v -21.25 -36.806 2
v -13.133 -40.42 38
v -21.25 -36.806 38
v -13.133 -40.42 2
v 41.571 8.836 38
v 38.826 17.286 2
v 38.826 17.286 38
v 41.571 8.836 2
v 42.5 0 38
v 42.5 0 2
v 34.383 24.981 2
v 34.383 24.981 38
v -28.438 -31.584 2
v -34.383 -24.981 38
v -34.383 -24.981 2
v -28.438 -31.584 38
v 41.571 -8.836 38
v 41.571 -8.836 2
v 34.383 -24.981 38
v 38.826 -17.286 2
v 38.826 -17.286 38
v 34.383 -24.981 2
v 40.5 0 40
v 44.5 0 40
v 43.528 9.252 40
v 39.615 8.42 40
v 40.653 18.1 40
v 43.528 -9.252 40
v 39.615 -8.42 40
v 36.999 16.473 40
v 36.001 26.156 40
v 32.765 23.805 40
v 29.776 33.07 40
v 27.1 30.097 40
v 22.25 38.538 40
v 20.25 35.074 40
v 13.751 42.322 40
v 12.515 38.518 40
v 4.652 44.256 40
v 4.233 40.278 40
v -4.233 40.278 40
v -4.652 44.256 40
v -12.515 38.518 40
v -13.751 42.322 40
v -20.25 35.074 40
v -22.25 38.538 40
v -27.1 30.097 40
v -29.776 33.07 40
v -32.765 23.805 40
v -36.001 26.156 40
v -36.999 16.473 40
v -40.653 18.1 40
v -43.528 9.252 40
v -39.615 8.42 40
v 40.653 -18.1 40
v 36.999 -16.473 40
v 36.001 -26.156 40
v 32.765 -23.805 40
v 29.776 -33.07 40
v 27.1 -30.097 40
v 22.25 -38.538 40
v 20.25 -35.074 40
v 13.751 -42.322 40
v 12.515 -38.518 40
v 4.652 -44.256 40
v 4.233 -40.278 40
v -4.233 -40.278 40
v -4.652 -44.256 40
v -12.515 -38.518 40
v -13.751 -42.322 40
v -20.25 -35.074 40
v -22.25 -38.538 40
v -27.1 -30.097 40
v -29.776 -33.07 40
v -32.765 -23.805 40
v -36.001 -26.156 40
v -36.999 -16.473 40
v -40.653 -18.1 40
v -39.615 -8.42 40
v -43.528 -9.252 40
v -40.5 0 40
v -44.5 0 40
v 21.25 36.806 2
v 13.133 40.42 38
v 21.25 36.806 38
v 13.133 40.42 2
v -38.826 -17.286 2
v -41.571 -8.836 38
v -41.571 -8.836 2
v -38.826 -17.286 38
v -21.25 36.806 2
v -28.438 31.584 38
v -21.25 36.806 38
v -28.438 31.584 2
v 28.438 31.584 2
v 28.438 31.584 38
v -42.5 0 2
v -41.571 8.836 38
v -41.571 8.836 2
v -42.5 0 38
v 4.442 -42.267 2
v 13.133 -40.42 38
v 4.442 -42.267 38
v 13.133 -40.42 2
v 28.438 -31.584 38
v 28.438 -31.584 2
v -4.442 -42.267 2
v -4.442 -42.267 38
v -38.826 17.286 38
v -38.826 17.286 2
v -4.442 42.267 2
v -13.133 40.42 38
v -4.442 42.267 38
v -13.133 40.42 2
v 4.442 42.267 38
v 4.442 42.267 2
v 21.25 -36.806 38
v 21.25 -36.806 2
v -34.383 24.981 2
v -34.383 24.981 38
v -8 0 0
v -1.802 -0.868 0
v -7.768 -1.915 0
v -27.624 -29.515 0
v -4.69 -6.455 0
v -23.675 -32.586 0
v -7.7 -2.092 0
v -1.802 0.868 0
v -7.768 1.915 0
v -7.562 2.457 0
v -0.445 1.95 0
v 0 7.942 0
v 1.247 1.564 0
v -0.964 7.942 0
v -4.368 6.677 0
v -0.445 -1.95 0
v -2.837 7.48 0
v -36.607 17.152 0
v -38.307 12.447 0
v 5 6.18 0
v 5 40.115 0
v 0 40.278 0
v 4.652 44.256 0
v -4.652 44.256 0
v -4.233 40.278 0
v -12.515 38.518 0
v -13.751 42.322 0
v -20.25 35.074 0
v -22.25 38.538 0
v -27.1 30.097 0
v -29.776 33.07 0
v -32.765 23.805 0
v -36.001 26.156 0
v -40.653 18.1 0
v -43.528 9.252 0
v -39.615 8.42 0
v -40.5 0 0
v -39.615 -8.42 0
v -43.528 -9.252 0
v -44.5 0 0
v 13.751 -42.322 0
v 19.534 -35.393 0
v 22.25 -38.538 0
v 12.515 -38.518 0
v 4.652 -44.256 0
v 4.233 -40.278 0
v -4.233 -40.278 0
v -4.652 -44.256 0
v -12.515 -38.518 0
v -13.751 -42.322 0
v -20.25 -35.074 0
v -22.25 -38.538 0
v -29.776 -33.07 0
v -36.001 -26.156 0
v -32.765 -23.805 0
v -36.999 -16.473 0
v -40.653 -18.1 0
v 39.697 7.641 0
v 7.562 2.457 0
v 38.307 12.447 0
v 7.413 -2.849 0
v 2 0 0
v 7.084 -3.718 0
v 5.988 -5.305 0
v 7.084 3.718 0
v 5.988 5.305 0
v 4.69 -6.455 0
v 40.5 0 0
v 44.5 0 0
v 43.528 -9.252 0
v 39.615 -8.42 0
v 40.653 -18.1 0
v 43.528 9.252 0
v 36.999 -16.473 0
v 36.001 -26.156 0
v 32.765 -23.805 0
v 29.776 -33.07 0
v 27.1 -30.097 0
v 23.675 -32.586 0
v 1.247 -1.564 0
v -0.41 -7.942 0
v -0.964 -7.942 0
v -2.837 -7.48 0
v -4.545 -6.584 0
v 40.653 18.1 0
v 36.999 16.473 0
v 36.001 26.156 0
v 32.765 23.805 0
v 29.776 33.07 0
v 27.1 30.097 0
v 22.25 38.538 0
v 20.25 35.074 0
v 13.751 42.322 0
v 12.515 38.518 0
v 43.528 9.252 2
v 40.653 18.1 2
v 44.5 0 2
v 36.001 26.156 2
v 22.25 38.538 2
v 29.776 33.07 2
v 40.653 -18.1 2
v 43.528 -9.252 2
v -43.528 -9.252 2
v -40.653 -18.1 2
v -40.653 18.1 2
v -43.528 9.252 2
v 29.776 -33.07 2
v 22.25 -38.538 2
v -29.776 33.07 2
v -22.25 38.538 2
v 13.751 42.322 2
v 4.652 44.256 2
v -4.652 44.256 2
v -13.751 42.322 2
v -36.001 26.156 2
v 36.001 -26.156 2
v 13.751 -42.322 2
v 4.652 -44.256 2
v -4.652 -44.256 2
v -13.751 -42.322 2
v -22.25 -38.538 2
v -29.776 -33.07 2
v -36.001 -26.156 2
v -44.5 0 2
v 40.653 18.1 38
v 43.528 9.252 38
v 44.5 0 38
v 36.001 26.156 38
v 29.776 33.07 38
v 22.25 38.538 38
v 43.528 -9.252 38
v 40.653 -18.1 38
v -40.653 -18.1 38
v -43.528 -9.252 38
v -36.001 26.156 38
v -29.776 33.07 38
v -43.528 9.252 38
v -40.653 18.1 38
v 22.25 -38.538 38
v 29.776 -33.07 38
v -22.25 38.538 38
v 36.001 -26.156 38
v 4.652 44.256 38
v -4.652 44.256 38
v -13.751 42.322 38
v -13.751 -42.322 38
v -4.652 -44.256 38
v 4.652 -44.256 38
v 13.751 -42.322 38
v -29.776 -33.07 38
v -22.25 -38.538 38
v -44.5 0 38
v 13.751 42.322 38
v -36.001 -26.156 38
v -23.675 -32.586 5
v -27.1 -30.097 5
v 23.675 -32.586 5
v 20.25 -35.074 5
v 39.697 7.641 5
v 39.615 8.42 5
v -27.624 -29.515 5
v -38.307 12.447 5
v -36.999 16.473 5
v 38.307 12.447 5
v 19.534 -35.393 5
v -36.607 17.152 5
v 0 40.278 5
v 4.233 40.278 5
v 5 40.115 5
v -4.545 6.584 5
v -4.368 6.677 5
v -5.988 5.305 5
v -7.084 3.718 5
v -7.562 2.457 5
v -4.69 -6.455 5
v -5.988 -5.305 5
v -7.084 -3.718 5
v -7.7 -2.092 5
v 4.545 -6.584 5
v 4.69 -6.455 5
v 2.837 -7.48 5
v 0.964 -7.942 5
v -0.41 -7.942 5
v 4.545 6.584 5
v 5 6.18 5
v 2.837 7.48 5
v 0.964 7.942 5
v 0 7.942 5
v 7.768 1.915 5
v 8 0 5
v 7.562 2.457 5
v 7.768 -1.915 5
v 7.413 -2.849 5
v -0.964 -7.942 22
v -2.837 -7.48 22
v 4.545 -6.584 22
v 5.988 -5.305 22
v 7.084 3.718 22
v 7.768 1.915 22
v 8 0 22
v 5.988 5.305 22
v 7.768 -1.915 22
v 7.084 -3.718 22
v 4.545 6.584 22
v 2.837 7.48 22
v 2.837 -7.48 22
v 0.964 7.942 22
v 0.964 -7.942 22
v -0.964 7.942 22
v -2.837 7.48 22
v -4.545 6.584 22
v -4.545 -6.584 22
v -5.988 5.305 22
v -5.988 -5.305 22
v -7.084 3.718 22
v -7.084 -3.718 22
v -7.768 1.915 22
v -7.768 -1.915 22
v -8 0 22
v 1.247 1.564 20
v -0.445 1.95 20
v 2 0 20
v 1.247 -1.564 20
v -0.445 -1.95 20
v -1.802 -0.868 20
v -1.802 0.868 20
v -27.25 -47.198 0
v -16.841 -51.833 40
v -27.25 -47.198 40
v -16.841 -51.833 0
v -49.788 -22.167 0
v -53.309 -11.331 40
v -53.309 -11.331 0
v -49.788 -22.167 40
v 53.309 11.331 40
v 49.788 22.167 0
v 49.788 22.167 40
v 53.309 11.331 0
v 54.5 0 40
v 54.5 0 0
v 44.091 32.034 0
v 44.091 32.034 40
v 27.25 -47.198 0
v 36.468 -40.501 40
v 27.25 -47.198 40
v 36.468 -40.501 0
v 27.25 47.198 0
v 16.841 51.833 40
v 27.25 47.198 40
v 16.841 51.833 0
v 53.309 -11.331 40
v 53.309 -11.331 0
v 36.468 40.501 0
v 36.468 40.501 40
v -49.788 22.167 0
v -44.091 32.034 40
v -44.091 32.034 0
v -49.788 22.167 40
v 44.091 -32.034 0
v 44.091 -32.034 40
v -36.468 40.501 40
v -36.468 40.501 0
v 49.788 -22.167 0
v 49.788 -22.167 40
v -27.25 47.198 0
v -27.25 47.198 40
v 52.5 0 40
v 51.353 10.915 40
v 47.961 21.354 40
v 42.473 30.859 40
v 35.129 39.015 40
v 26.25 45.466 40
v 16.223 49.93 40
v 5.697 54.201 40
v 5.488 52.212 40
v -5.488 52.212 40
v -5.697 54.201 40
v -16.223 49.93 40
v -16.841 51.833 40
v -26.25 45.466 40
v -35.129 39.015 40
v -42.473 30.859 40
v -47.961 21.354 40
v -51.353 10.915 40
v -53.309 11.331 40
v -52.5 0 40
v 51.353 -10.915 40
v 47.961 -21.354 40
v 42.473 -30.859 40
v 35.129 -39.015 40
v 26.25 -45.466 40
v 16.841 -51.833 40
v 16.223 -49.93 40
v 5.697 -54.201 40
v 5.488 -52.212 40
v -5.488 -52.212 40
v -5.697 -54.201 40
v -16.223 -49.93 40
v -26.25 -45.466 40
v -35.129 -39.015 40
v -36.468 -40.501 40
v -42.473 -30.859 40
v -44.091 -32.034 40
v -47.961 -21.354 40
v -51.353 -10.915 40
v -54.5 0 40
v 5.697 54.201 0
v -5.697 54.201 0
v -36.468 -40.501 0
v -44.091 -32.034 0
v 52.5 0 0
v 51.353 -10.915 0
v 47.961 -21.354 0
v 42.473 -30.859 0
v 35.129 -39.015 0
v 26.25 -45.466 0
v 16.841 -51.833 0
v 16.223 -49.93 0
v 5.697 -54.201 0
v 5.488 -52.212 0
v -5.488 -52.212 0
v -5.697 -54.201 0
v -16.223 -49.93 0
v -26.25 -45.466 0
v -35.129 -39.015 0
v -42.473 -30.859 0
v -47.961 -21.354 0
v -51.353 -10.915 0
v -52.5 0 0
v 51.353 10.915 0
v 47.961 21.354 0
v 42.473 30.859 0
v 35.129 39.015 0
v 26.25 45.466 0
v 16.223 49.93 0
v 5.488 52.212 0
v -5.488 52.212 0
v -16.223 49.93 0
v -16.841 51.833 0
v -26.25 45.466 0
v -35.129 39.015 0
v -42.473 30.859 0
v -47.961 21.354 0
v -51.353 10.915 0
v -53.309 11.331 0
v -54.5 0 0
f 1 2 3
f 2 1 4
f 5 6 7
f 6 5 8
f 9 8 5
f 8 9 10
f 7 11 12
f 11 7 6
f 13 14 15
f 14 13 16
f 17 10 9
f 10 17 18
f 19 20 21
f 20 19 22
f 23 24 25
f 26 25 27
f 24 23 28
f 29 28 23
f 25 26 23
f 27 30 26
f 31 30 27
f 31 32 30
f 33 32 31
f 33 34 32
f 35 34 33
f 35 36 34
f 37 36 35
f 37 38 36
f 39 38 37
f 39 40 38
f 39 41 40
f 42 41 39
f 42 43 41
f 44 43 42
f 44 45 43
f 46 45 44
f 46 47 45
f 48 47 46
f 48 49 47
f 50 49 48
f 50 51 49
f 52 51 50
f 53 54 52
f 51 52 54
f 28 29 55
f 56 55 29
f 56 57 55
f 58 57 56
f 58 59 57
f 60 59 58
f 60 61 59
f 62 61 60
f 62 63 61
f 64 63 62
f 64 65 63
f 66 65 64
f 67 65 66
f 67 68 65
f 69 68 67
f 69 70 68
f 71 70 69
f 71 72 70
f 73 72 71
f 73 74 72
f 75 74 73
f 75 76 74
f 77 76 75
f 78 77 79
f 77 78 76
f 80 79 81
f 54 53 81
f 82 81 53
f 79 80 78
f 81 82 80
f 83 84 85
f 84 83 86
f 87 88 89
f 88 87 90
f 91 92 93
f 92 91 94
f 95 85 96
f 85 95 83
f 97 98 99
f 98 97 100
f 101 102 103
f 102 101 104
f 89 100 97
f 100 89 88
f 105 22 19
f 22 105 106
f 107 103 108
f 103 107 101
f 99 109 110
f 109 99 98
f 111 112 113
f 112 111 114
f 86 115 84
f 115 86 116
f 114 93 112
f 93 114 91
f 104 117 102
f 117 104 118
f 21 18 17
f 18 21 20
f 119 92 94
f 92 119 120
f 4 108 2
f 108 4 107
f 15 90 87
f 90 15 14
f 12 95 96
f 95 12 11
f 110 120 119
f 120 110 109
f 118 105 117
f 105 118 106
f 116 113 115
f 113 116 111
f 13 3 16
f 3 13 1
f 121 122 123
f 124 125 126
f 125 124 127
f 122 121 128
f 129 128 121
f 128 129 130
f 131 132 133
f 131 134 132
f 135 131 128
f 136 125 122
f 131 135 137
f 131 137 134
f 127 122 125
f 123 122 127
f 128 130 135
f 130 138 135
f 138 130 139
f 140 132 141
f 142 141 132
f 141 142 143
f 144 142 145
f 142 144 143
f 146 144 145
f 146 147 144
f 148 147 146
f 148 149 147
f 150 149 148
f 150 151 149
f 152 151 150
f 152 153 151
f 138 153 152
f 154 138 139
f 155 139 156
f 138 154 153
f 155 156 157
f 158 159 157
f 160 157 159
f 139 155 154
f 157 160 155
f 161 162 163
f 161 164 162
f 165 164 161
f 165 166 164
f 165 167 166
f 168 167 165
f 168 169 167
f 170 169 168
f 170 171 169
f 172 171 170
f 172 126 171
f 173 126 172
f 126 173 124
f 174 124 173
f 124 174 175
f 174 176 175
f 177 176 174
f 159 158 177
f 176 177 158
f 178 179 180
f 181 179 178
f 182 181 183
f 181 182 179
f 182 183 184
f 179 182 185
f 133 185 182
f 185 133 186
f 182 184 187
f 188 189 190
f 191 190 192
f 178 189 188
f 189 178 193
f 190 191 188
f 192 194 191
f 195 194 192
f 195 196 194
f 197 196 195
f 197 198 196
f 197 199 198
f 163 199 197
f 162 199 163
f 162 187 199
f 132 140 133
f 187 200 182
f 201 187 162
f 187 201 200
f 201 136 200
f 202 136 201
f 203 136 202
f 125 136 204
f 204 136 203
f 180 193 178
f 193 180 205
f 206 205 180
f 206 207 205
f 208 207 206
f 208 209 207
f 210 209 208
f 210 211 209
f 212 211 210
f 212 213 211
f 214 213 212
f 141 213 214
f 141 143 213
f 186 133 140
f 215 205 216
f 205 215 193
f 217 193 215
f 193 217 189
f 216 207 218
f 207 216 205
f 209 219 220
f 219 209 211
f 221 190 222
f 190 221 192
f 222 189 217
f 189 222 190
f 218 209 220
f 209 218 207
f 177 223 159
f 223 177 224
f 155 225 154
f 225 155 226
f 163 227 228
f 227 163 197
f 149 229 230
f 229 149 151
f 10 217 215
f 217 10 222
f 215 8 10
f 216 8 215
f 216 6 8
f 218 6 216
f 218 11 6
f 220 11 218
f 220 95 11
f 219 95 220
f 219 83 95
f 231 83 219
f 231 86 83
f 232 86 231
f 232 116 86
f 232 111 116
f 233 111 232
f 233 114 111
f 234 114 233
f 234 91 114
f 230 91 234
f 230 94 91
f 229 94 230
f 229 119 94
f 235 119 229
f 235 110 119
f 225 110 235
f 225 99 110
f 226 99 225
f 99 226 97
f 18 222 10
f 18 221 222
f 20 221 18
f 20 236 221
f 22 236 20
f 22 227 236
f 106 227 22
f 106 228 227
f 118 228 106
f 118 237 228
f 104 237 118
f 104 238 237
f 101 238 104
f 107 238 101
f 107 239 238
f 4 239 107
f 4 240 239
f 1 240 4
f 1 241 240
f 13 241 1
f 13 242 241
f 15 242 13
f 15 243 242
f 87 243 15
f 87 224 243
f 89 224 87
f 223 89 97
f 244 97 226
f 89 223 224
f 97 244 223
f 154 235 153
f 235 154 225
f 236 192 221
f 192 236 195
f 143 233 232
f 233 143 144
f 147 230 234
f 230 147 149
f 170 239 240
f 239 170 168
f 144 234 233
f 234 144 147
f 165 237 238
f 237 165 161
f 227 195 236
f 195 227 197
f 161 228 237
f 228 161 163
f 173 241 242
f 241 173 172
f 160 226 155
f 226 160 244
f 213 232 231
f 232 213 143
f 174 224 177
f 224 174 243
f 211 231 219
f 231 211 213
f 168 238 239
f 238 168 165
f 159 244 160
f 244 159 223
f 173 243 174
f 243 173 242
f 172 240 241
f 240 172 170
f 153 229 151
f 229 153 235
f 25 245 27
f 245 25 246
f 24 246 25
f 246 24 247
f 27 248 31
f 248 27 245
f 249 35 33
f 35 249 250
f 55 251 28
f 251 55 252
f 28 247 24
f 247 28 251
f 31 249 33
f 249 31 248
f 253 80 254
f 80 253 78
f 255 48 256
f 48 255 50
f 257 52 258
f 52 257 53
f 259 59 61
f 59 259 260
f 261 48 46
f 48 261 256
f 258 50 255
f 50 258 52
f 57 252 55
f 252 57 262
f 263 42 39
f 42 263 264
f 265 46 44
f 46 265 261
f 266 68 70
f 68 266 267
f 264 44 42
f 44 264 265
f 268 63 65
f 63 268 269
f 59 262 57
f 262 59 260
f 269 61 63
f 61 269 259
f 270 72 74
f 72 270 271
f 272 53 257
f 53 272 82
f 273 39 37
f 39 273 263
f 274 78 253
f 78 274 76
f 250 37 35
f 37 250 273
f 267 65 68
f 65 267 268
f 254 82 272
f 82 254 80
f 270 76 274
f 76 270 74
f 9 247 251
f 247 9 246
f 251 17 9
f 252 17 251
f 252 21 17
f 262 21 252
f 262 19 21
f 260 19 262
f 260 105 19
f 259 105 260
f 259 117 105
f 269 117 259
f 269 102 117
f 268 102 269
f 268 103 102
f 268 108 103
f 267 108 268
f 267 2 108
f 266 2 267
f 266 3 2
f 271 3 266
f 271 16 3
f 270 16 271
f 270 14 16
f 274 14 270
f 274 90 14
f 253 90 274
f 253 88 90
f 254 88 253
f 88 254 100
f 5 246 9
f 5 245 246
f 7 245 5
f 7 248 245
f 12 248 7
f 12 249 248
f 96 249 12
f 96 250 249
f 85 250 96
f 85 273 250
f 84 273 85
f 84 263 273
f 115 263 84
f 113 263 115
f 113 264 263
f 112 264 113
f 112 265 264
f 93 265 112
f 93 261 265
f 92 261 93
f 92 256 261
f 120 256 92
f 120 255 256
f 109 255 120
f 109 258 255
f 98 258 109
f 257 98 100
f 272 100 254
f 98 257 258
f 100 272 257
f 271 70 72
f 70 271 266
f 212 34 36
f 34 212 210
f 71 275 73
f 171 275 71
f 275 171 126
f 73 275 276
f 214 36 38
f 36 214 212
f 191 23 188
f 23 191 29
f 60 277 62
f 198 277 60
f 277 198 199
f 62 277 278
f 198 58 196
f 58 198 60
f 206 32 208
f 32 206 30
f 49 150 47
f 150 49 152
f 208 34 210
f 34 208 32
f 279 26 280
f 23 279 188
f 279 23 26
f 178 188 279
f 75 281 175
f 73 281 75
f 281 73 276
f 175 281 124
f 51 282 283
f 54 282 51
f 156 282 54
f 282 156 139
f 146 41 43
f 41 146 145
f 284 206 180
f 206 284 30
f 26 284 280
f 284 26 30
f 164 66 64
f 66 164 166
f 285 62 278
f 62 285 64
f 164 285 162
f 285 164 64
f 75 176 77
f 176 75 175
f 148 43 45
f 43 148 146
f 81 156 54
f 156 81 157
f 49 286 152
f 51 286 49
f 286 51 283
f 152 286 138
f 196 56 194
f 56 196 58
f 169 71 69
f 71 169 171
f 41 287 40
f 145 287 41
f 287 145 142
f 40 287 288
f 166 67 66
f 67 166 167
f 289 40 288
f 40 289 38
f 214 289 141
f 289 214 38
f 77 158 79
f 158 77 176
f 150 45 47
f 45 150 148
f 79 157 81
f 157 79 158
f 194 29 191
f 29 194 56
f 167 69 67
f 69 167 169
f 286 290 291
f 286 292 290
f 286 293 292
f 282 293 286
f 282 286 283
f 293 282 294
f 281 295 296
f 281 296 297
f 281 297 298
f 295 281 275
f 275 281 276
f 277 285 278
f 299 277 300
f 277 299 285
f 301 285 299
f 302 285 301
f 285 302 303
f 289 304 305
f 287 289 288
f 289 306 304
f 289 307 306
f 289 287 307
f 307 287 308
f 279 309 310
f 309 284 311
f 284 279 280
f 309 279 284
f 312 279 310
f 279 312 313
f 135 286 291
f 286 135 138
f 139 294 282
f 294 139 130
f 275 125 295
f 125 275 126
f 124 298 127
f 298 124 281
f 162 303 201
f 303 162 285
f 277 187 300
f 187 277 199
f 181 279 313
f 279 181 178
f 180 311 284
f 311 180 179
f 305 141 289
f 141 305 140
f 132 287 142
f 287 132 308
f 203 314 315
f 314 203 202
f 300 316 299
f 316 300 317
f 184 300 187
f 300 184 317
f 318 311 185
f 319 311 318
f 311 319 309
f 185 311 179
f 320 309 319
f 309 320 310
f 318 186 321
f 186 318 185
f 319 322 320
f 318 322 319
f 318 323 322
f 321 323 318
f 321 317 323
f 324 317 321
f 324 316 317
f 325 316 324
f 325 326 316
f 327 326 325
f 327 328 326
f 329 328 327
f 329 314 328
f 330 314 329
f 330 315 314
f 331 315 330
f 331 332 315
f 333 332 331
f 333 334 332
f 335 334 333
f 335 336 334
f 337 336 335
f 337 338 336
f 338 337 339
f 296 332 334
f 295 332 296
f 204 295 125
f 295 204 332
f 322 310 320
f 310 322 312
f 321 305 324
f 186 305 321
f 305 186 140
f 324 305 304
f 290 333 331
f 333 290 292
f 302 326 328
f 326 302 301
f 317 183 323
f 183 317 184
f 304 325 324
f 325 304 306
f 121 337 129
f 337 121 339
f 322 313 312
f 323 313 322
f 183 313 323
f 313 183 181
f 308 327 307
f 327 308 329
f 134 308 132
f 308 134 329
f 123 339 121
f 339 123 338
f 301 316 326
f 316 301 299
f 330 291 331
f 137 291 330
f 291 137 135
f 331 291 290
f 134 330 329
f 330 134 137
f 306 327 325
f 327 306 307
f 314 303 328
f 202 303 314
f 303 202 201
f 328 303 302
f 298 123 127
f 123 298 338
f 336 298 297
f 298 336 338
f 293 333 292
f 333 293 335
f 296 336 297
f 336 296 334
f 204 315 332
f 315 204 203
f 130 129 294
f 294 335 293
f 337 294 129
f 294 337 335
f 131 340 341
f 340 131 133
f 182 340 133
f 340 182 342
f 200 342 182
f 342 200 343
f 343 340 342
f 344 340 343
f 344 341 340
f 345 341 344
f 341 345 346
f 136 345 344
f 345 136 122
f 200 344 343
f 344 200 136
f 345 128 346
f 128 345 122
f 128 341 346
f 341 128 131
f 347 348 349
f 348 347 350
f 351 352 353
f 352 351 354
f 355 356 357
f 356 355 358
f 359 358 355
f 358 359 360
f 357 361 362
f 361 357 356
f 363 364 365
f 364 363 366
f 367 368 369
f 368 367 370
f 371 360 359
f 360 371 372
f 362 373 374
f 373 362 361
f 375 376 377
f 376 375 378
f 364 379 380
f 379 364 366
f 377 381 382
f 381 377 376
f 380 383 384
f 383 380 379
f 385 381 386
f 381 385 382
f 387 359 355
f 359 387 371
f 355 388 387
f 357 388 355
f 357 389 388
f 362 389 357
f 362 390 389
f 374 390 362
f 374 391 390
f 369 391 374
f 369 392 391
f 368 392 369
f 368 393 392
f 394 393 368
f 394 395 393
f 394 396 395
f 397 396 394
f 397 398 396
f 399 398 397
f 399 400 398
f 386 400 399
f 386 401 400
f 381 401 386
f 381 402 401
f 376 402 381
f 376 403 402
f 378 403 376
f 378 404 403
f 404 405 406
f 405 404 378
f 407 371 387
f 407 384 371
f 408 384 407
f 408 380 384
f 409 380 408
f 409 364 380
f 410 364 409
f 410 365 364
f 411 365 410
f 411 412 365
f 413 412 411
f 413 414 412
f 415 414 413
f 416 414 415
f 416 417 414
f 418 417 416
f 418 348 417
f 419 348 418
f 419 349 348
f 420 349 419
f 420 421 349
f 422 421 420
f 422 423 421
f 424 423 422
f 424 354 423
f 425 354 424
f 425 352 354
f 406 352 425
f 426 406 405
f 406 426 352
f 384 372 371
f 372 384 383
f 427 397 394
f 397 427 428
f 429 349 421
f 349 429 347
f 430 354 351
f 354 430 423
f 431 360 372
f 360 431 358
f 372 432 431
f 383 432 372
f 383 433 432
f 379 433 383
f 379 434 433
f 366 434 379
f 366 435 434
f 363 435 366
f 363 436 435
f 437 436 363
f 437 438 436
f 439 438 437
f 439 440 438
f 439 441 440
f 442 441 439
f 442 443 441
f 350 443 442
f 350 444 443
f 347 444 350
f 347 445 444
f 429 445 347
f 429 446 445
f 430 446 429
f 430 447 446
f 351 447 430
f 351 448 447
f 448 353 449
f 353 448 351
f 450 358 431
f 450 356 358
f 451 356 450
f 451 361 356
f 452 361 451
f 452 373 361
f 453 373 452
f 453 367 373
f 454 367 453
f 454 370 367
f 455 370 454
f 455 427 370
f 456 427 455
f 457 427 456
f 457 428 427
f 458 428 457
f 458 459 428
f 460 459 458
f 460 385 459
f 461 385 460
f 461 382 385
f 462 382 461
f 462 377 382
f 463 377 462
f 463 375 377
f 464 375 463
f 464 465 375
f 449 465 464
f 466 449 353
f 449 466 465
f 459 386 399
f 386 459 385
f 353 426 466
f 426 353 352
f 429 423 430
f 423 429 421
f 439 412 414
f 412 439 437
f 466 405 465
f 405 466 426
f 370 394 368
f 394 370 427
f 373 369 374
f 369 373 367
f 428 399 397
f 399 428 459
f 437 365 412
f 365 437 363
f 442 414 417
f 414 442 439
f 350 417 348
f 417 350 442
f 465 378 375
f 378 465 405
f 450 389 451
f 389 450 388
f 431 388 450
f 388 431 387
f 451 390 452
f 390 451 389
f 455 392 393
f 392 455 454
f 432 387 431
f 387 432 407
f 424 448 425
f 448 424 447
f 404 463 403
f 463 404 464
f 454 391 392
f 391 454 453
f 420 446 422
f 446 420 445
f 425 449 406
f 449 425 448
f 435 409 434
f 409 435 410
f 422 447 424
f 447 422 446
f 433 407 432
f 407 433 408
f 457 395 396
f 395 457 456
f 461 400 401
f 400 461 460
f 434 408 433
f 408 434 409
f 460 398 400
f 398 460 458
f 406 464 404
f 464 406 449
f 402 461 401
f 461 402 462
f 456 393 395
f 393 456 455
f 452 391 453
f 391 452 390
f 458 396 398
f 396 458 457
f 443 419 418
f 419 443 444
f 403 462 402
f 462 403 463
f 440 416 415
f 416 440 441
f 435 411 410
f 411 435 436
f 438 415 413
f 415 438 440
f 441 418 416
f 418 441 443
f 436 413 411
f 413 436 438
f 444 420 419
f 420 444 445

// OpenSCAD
spindle_d= 4;
spindle_l = 20;
inner_hub_d = spindle_d + 4;
outer_rim_d = 85;
outer_rim_thickness = 2;
outer_rim_height    = 40;
num_spokes = 5;
spoke_width = 5;
tyre_width = 10;

difference(){
    union (){
        outer_rim();
        //hub();
        inner_hub();
        spokes();
    }
    spindle();
}

tyre_mould();

module spindle(){
    difference(){
        cylinder (r = spindle_d/2, h = spindle_l);
    }
    
}


module outer_rim(){
    difference(){
        union (){
        cylinder (r=outer_rim_d/2, h= outer_rim_height);
        cylinder (r = outer_rim_d/2 + 2, h = outer_rim_thickness);   
        translate([0,0,outer_rim_height - outer_rim_thickness]){
            cylinder (r = outer_rim_d/2 + 2, h = outer_rim_thickness);  
        }   
        }
        cylinder (r=outer_rim_d/2 - outer_rim_thickness, h= outer_rim_height);  
        }
    }

module hub(){
    cylinder (r=outer_rim_d/2, h= outer_rim_thickness);   
}

module inner_hub (){
    cylinder (r = inner_hub_d, h = spindle_l + outer_rim_thickness);
    
}

module spokes(){
    
    intersection(){
    for (i = [1:5]){
        rotate ([0,0,i*(360/num_spokes)]){
            translate ([0,0,0])
                cube([spoke_width, outer_rim_d/2, spoke_width]);
        }
        
    }
          cylinder (r=outer_rim_d/2, h= outer_rim_height);  
}
}

module tyre_mould(){
    difference (){
        cylinder (r = outer_rim_d/2 + tyre_width + outer_rim_thickness, h = outer_rim_height);
        cylinder (r = outer_rim_d/2 + tyre_width, h = outer_rim_height);        
    }
}
